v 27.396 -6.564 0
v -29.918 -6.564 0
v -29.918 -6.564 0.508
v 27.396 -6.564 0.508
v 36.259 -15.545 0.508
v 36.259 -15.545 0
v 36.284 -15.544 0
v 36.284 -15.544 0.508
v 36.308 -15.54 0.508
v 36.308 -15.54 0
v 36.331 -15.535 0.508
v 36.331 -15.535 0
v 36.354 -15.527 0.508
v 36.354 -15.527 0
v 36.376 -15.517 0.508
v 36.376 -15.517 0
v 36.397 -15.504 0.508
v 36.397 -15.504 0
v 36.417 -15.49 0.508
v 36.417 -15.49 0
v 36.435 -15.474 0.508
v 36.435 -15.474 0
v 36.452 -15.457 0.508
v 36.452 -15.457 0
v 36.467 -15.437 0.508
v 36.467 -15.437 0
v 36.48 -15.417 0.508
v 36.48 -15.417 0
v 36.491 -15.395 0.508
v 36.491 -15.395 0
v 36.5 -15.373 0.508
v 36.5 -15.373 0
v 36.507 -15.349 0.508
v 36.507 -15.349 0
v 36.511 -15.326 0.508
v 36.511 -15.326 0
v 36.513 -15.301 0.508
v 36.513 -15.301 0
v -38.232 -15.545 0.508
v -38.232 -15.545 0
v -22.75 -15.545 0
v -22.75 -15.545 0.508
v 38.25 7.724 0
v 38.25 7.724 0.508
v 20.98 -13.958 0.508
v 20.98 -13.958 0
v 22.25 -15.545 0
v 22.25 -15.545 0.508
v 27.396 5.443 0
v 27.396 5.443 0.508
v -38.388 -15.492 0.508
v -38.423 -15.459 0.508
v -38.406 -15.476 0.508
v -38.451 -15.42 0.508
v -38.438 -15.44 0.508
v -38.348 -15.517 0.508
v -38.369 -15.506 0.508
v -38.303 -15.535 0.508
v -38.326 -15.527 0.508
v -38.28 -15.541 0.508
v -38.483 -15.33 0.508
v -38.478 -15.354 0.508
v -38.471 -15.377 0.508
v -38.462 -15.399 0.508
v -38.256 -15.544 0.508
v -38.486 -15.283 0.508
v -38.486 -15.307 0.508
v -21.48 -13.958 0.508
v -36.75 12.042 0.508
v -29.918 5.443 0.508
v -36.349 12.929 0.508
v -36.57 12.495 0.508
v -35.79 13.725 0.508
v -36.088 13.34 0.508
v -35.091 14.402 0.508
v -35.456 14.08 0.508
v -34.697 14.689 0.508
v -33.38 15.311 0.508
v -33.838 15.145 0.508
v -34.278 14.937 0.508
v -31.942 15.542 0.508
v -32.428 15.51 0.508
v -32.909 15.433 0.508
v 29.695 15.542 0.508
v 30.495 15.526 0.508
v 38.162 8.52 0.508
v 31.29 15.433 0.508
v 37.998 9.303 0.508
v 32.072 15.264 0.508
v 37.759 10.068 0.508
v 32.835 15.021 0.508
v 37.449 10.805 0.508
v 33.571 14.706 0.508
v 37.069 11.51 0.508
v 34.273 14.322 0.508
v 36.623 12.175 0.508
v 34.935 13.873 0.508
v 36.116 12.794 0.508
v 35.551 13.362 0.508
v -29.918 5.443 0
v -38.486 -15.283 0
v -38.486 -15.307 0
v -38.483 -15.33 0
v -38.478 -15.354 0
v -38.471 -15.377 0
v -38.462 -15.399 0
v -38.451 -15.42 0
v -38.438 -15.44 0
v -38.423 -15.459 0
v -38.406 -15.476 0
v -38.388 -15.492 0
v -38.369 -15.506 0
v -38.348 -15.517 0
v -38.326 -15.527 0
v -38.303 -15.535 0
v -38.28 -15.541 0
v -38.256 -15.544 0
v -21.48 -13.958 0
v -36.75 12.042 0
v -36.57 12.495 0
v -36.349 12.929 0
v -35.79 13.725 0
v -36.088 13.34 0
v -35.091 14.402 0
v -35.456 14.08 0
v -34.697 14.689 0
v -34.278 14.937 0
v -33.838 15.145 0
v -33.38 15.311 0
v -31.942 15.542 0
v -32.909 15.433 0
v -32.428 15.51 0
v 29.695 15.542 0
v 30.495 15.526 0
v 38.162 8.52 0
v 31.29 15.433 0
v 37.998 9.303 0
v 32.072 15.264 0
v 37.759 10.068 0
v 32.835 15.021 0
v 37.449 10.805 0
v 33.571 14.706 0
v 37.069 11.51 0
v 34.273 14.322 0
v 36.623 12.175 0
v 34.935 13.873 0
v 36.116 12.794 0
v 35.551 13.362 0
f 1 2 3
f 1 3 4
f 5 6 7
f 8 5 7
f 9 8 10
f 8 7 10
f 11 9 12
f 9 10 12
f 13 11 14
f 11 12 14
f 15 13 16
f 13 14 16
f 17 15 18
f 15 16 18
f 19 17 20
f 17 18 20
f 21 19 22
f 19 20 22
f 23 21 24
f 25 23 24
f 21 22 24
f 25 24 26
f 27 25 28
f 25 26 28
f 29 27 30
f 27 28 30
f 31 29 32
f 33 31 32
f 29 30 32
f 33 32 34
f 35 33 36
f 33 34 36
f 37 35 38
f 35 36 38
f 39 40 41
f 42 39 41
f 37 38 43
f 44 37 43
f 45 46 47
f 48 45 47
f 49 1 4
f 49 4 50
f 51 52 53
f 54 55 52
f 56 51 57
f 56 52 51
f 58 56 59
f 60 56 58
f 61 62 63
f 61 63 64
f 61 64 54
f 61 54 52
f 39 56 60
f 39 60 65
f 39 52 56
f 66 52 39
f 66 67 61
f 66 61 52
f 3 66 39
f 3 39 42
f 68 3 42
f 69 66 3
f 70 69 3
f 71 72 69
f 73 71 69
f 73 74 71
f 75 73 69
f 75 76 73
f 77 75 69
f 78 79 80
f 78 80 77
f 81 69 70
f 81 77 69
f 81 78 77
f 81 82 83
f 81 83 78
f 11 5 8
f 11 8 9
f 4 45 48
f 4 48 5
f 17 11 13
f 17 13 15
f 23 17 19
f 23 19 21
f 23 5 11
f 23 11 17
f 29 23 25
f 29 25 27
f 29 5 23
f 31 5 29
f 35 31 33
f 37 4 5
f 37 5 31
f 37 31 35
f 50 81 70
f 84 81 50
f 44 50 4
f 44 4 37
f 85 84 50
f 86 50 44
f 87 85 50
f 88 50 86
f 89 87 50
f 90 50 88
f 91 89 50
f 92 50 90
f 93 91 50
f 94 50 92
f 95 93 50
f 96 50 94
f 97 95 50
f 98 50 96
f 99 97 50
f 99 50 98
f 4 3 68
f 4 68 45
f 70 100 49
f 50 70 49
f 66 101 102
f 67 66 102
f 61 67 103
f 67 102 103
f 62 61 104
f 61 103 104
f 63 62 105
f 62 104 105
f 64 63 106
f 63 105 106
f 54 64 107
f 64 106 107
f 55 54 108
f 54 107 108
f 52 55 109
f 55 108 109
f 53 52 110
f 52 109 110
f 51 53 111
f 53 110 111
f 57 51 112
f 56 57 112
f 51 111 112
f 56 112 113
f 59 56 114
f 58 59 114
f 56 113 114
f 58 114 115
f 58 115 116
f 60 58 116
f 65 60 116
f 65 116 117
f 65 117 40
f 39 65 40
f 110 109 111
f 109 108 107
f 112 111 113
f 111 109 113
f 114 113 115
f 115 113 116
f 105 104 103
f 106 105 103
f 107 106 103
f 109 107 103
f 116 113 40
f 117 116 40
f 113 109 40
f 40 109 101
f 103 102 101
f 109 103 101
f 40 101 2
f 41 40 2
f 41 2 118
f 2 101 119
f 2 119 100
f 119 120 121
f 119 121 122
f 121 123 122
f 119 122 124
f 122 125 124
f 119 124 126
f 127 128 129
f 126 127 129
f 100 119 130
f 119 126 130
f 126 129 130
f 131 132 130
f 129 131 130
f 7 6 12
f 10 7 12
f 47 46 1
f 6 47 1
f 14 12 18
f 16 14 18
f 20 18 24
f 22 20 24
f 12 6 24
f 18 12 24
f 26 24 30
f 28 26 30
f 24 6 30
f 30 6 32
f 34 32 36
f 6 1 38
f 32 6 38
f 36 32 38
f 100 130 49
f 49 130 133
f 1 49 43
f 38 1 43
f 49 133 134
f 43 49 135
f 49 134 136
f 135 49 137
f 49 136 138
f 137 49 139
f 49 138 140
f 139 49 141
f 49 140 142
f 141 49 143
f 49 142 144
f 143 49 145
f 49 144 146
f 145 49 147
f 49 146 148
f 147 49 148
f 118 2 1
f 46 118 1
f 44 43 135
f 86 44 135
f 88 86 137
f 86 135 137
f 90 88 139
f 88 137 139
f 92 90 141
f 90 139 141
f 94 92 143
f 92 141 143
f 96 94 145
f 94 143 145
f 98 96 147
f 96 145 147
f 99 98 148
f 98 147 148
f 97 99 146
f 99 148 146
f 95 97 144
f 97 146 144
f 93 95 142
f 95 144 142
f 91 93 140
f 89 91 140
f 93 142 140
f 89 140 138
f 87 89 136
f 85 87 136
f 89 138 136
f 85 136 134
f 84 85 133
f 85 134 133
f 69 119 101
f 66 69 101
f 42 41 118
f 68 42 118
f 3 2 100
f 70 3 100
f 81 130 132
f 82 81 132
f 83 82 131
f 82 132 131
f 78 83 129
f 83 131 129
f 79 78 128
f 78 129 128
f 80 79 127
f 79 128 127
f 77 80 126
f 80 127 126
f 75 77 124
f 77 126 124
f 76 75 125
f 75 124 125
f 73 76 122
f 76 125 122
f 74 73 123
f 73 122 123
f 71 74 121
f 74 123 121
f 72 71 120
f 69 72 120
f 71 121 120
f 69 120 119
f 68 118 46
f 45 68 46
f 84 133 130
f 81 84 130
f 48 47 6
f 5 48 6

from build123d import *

# Parameters (mm, degrees)
F0_W     = 57.3139749467
F0_H     = 12.0063517243
F1_DEPTH = 0.508


# Not quite as in the source:
# - ends of sketch curves that miss each other by under 0.0002 mm in the source are joined


with BuildPart() as f1:
    # F0 (on Top) → F1 (new body)
    with BuildSketch(Plane.XY):
        with BuildLine():
            Line((-36.7499960837, 12.0419642886), (-38.4861308, -15.2827228))
            ThreePointArc((-38.4861308, -15.2827228), (-38.4148753009, -15.4677583266), (-38.2323086, -15.5451301886))
            Line((-38.2323086, -15.5451301886), (-22.7499926, -15.545054))
            Line((-22.7499926, -15.545054), (-21.4799926, -13.9580366))
            Line((-21.4799926, -13.9580366), (20.9799936, -13.9580366))
            Line((20.9799936, -13.9580366), (22.2499936, -15.545054))
            Line((22.2499936, -15.545054), (36.2593128, -15.545054))
            ThreePointArc((36.2593128, -15.545054), (36.4352434048, -15.4742599559), (36.5131044113, -15.3013407897))
            Line((36.5131044113, -15.3013407897), (38.2500089611, 7.7244699848))
            ThreePointArc((38.2500089611, 7.7244699848), (35.5514966121, 13.3615420014), (29.6945050156, 15.5419546358))
            Line((29.6945050156, 15.5419546358), (-31.9416938, 15.5419806))
            ThreePointArc((-31.9416938, 15.5419806), (-34.897631264, 14.5500112443), (-36.7499960837, 12.0419642886))
        make_face()
        with Locations((-1.2608356774, -0.5606063642)):
            Rectangle(F0_W, F0_H, mode=Mode.SUBTRACT)
    extrude(amount=F1_DEPTH)


solid = f1.part
